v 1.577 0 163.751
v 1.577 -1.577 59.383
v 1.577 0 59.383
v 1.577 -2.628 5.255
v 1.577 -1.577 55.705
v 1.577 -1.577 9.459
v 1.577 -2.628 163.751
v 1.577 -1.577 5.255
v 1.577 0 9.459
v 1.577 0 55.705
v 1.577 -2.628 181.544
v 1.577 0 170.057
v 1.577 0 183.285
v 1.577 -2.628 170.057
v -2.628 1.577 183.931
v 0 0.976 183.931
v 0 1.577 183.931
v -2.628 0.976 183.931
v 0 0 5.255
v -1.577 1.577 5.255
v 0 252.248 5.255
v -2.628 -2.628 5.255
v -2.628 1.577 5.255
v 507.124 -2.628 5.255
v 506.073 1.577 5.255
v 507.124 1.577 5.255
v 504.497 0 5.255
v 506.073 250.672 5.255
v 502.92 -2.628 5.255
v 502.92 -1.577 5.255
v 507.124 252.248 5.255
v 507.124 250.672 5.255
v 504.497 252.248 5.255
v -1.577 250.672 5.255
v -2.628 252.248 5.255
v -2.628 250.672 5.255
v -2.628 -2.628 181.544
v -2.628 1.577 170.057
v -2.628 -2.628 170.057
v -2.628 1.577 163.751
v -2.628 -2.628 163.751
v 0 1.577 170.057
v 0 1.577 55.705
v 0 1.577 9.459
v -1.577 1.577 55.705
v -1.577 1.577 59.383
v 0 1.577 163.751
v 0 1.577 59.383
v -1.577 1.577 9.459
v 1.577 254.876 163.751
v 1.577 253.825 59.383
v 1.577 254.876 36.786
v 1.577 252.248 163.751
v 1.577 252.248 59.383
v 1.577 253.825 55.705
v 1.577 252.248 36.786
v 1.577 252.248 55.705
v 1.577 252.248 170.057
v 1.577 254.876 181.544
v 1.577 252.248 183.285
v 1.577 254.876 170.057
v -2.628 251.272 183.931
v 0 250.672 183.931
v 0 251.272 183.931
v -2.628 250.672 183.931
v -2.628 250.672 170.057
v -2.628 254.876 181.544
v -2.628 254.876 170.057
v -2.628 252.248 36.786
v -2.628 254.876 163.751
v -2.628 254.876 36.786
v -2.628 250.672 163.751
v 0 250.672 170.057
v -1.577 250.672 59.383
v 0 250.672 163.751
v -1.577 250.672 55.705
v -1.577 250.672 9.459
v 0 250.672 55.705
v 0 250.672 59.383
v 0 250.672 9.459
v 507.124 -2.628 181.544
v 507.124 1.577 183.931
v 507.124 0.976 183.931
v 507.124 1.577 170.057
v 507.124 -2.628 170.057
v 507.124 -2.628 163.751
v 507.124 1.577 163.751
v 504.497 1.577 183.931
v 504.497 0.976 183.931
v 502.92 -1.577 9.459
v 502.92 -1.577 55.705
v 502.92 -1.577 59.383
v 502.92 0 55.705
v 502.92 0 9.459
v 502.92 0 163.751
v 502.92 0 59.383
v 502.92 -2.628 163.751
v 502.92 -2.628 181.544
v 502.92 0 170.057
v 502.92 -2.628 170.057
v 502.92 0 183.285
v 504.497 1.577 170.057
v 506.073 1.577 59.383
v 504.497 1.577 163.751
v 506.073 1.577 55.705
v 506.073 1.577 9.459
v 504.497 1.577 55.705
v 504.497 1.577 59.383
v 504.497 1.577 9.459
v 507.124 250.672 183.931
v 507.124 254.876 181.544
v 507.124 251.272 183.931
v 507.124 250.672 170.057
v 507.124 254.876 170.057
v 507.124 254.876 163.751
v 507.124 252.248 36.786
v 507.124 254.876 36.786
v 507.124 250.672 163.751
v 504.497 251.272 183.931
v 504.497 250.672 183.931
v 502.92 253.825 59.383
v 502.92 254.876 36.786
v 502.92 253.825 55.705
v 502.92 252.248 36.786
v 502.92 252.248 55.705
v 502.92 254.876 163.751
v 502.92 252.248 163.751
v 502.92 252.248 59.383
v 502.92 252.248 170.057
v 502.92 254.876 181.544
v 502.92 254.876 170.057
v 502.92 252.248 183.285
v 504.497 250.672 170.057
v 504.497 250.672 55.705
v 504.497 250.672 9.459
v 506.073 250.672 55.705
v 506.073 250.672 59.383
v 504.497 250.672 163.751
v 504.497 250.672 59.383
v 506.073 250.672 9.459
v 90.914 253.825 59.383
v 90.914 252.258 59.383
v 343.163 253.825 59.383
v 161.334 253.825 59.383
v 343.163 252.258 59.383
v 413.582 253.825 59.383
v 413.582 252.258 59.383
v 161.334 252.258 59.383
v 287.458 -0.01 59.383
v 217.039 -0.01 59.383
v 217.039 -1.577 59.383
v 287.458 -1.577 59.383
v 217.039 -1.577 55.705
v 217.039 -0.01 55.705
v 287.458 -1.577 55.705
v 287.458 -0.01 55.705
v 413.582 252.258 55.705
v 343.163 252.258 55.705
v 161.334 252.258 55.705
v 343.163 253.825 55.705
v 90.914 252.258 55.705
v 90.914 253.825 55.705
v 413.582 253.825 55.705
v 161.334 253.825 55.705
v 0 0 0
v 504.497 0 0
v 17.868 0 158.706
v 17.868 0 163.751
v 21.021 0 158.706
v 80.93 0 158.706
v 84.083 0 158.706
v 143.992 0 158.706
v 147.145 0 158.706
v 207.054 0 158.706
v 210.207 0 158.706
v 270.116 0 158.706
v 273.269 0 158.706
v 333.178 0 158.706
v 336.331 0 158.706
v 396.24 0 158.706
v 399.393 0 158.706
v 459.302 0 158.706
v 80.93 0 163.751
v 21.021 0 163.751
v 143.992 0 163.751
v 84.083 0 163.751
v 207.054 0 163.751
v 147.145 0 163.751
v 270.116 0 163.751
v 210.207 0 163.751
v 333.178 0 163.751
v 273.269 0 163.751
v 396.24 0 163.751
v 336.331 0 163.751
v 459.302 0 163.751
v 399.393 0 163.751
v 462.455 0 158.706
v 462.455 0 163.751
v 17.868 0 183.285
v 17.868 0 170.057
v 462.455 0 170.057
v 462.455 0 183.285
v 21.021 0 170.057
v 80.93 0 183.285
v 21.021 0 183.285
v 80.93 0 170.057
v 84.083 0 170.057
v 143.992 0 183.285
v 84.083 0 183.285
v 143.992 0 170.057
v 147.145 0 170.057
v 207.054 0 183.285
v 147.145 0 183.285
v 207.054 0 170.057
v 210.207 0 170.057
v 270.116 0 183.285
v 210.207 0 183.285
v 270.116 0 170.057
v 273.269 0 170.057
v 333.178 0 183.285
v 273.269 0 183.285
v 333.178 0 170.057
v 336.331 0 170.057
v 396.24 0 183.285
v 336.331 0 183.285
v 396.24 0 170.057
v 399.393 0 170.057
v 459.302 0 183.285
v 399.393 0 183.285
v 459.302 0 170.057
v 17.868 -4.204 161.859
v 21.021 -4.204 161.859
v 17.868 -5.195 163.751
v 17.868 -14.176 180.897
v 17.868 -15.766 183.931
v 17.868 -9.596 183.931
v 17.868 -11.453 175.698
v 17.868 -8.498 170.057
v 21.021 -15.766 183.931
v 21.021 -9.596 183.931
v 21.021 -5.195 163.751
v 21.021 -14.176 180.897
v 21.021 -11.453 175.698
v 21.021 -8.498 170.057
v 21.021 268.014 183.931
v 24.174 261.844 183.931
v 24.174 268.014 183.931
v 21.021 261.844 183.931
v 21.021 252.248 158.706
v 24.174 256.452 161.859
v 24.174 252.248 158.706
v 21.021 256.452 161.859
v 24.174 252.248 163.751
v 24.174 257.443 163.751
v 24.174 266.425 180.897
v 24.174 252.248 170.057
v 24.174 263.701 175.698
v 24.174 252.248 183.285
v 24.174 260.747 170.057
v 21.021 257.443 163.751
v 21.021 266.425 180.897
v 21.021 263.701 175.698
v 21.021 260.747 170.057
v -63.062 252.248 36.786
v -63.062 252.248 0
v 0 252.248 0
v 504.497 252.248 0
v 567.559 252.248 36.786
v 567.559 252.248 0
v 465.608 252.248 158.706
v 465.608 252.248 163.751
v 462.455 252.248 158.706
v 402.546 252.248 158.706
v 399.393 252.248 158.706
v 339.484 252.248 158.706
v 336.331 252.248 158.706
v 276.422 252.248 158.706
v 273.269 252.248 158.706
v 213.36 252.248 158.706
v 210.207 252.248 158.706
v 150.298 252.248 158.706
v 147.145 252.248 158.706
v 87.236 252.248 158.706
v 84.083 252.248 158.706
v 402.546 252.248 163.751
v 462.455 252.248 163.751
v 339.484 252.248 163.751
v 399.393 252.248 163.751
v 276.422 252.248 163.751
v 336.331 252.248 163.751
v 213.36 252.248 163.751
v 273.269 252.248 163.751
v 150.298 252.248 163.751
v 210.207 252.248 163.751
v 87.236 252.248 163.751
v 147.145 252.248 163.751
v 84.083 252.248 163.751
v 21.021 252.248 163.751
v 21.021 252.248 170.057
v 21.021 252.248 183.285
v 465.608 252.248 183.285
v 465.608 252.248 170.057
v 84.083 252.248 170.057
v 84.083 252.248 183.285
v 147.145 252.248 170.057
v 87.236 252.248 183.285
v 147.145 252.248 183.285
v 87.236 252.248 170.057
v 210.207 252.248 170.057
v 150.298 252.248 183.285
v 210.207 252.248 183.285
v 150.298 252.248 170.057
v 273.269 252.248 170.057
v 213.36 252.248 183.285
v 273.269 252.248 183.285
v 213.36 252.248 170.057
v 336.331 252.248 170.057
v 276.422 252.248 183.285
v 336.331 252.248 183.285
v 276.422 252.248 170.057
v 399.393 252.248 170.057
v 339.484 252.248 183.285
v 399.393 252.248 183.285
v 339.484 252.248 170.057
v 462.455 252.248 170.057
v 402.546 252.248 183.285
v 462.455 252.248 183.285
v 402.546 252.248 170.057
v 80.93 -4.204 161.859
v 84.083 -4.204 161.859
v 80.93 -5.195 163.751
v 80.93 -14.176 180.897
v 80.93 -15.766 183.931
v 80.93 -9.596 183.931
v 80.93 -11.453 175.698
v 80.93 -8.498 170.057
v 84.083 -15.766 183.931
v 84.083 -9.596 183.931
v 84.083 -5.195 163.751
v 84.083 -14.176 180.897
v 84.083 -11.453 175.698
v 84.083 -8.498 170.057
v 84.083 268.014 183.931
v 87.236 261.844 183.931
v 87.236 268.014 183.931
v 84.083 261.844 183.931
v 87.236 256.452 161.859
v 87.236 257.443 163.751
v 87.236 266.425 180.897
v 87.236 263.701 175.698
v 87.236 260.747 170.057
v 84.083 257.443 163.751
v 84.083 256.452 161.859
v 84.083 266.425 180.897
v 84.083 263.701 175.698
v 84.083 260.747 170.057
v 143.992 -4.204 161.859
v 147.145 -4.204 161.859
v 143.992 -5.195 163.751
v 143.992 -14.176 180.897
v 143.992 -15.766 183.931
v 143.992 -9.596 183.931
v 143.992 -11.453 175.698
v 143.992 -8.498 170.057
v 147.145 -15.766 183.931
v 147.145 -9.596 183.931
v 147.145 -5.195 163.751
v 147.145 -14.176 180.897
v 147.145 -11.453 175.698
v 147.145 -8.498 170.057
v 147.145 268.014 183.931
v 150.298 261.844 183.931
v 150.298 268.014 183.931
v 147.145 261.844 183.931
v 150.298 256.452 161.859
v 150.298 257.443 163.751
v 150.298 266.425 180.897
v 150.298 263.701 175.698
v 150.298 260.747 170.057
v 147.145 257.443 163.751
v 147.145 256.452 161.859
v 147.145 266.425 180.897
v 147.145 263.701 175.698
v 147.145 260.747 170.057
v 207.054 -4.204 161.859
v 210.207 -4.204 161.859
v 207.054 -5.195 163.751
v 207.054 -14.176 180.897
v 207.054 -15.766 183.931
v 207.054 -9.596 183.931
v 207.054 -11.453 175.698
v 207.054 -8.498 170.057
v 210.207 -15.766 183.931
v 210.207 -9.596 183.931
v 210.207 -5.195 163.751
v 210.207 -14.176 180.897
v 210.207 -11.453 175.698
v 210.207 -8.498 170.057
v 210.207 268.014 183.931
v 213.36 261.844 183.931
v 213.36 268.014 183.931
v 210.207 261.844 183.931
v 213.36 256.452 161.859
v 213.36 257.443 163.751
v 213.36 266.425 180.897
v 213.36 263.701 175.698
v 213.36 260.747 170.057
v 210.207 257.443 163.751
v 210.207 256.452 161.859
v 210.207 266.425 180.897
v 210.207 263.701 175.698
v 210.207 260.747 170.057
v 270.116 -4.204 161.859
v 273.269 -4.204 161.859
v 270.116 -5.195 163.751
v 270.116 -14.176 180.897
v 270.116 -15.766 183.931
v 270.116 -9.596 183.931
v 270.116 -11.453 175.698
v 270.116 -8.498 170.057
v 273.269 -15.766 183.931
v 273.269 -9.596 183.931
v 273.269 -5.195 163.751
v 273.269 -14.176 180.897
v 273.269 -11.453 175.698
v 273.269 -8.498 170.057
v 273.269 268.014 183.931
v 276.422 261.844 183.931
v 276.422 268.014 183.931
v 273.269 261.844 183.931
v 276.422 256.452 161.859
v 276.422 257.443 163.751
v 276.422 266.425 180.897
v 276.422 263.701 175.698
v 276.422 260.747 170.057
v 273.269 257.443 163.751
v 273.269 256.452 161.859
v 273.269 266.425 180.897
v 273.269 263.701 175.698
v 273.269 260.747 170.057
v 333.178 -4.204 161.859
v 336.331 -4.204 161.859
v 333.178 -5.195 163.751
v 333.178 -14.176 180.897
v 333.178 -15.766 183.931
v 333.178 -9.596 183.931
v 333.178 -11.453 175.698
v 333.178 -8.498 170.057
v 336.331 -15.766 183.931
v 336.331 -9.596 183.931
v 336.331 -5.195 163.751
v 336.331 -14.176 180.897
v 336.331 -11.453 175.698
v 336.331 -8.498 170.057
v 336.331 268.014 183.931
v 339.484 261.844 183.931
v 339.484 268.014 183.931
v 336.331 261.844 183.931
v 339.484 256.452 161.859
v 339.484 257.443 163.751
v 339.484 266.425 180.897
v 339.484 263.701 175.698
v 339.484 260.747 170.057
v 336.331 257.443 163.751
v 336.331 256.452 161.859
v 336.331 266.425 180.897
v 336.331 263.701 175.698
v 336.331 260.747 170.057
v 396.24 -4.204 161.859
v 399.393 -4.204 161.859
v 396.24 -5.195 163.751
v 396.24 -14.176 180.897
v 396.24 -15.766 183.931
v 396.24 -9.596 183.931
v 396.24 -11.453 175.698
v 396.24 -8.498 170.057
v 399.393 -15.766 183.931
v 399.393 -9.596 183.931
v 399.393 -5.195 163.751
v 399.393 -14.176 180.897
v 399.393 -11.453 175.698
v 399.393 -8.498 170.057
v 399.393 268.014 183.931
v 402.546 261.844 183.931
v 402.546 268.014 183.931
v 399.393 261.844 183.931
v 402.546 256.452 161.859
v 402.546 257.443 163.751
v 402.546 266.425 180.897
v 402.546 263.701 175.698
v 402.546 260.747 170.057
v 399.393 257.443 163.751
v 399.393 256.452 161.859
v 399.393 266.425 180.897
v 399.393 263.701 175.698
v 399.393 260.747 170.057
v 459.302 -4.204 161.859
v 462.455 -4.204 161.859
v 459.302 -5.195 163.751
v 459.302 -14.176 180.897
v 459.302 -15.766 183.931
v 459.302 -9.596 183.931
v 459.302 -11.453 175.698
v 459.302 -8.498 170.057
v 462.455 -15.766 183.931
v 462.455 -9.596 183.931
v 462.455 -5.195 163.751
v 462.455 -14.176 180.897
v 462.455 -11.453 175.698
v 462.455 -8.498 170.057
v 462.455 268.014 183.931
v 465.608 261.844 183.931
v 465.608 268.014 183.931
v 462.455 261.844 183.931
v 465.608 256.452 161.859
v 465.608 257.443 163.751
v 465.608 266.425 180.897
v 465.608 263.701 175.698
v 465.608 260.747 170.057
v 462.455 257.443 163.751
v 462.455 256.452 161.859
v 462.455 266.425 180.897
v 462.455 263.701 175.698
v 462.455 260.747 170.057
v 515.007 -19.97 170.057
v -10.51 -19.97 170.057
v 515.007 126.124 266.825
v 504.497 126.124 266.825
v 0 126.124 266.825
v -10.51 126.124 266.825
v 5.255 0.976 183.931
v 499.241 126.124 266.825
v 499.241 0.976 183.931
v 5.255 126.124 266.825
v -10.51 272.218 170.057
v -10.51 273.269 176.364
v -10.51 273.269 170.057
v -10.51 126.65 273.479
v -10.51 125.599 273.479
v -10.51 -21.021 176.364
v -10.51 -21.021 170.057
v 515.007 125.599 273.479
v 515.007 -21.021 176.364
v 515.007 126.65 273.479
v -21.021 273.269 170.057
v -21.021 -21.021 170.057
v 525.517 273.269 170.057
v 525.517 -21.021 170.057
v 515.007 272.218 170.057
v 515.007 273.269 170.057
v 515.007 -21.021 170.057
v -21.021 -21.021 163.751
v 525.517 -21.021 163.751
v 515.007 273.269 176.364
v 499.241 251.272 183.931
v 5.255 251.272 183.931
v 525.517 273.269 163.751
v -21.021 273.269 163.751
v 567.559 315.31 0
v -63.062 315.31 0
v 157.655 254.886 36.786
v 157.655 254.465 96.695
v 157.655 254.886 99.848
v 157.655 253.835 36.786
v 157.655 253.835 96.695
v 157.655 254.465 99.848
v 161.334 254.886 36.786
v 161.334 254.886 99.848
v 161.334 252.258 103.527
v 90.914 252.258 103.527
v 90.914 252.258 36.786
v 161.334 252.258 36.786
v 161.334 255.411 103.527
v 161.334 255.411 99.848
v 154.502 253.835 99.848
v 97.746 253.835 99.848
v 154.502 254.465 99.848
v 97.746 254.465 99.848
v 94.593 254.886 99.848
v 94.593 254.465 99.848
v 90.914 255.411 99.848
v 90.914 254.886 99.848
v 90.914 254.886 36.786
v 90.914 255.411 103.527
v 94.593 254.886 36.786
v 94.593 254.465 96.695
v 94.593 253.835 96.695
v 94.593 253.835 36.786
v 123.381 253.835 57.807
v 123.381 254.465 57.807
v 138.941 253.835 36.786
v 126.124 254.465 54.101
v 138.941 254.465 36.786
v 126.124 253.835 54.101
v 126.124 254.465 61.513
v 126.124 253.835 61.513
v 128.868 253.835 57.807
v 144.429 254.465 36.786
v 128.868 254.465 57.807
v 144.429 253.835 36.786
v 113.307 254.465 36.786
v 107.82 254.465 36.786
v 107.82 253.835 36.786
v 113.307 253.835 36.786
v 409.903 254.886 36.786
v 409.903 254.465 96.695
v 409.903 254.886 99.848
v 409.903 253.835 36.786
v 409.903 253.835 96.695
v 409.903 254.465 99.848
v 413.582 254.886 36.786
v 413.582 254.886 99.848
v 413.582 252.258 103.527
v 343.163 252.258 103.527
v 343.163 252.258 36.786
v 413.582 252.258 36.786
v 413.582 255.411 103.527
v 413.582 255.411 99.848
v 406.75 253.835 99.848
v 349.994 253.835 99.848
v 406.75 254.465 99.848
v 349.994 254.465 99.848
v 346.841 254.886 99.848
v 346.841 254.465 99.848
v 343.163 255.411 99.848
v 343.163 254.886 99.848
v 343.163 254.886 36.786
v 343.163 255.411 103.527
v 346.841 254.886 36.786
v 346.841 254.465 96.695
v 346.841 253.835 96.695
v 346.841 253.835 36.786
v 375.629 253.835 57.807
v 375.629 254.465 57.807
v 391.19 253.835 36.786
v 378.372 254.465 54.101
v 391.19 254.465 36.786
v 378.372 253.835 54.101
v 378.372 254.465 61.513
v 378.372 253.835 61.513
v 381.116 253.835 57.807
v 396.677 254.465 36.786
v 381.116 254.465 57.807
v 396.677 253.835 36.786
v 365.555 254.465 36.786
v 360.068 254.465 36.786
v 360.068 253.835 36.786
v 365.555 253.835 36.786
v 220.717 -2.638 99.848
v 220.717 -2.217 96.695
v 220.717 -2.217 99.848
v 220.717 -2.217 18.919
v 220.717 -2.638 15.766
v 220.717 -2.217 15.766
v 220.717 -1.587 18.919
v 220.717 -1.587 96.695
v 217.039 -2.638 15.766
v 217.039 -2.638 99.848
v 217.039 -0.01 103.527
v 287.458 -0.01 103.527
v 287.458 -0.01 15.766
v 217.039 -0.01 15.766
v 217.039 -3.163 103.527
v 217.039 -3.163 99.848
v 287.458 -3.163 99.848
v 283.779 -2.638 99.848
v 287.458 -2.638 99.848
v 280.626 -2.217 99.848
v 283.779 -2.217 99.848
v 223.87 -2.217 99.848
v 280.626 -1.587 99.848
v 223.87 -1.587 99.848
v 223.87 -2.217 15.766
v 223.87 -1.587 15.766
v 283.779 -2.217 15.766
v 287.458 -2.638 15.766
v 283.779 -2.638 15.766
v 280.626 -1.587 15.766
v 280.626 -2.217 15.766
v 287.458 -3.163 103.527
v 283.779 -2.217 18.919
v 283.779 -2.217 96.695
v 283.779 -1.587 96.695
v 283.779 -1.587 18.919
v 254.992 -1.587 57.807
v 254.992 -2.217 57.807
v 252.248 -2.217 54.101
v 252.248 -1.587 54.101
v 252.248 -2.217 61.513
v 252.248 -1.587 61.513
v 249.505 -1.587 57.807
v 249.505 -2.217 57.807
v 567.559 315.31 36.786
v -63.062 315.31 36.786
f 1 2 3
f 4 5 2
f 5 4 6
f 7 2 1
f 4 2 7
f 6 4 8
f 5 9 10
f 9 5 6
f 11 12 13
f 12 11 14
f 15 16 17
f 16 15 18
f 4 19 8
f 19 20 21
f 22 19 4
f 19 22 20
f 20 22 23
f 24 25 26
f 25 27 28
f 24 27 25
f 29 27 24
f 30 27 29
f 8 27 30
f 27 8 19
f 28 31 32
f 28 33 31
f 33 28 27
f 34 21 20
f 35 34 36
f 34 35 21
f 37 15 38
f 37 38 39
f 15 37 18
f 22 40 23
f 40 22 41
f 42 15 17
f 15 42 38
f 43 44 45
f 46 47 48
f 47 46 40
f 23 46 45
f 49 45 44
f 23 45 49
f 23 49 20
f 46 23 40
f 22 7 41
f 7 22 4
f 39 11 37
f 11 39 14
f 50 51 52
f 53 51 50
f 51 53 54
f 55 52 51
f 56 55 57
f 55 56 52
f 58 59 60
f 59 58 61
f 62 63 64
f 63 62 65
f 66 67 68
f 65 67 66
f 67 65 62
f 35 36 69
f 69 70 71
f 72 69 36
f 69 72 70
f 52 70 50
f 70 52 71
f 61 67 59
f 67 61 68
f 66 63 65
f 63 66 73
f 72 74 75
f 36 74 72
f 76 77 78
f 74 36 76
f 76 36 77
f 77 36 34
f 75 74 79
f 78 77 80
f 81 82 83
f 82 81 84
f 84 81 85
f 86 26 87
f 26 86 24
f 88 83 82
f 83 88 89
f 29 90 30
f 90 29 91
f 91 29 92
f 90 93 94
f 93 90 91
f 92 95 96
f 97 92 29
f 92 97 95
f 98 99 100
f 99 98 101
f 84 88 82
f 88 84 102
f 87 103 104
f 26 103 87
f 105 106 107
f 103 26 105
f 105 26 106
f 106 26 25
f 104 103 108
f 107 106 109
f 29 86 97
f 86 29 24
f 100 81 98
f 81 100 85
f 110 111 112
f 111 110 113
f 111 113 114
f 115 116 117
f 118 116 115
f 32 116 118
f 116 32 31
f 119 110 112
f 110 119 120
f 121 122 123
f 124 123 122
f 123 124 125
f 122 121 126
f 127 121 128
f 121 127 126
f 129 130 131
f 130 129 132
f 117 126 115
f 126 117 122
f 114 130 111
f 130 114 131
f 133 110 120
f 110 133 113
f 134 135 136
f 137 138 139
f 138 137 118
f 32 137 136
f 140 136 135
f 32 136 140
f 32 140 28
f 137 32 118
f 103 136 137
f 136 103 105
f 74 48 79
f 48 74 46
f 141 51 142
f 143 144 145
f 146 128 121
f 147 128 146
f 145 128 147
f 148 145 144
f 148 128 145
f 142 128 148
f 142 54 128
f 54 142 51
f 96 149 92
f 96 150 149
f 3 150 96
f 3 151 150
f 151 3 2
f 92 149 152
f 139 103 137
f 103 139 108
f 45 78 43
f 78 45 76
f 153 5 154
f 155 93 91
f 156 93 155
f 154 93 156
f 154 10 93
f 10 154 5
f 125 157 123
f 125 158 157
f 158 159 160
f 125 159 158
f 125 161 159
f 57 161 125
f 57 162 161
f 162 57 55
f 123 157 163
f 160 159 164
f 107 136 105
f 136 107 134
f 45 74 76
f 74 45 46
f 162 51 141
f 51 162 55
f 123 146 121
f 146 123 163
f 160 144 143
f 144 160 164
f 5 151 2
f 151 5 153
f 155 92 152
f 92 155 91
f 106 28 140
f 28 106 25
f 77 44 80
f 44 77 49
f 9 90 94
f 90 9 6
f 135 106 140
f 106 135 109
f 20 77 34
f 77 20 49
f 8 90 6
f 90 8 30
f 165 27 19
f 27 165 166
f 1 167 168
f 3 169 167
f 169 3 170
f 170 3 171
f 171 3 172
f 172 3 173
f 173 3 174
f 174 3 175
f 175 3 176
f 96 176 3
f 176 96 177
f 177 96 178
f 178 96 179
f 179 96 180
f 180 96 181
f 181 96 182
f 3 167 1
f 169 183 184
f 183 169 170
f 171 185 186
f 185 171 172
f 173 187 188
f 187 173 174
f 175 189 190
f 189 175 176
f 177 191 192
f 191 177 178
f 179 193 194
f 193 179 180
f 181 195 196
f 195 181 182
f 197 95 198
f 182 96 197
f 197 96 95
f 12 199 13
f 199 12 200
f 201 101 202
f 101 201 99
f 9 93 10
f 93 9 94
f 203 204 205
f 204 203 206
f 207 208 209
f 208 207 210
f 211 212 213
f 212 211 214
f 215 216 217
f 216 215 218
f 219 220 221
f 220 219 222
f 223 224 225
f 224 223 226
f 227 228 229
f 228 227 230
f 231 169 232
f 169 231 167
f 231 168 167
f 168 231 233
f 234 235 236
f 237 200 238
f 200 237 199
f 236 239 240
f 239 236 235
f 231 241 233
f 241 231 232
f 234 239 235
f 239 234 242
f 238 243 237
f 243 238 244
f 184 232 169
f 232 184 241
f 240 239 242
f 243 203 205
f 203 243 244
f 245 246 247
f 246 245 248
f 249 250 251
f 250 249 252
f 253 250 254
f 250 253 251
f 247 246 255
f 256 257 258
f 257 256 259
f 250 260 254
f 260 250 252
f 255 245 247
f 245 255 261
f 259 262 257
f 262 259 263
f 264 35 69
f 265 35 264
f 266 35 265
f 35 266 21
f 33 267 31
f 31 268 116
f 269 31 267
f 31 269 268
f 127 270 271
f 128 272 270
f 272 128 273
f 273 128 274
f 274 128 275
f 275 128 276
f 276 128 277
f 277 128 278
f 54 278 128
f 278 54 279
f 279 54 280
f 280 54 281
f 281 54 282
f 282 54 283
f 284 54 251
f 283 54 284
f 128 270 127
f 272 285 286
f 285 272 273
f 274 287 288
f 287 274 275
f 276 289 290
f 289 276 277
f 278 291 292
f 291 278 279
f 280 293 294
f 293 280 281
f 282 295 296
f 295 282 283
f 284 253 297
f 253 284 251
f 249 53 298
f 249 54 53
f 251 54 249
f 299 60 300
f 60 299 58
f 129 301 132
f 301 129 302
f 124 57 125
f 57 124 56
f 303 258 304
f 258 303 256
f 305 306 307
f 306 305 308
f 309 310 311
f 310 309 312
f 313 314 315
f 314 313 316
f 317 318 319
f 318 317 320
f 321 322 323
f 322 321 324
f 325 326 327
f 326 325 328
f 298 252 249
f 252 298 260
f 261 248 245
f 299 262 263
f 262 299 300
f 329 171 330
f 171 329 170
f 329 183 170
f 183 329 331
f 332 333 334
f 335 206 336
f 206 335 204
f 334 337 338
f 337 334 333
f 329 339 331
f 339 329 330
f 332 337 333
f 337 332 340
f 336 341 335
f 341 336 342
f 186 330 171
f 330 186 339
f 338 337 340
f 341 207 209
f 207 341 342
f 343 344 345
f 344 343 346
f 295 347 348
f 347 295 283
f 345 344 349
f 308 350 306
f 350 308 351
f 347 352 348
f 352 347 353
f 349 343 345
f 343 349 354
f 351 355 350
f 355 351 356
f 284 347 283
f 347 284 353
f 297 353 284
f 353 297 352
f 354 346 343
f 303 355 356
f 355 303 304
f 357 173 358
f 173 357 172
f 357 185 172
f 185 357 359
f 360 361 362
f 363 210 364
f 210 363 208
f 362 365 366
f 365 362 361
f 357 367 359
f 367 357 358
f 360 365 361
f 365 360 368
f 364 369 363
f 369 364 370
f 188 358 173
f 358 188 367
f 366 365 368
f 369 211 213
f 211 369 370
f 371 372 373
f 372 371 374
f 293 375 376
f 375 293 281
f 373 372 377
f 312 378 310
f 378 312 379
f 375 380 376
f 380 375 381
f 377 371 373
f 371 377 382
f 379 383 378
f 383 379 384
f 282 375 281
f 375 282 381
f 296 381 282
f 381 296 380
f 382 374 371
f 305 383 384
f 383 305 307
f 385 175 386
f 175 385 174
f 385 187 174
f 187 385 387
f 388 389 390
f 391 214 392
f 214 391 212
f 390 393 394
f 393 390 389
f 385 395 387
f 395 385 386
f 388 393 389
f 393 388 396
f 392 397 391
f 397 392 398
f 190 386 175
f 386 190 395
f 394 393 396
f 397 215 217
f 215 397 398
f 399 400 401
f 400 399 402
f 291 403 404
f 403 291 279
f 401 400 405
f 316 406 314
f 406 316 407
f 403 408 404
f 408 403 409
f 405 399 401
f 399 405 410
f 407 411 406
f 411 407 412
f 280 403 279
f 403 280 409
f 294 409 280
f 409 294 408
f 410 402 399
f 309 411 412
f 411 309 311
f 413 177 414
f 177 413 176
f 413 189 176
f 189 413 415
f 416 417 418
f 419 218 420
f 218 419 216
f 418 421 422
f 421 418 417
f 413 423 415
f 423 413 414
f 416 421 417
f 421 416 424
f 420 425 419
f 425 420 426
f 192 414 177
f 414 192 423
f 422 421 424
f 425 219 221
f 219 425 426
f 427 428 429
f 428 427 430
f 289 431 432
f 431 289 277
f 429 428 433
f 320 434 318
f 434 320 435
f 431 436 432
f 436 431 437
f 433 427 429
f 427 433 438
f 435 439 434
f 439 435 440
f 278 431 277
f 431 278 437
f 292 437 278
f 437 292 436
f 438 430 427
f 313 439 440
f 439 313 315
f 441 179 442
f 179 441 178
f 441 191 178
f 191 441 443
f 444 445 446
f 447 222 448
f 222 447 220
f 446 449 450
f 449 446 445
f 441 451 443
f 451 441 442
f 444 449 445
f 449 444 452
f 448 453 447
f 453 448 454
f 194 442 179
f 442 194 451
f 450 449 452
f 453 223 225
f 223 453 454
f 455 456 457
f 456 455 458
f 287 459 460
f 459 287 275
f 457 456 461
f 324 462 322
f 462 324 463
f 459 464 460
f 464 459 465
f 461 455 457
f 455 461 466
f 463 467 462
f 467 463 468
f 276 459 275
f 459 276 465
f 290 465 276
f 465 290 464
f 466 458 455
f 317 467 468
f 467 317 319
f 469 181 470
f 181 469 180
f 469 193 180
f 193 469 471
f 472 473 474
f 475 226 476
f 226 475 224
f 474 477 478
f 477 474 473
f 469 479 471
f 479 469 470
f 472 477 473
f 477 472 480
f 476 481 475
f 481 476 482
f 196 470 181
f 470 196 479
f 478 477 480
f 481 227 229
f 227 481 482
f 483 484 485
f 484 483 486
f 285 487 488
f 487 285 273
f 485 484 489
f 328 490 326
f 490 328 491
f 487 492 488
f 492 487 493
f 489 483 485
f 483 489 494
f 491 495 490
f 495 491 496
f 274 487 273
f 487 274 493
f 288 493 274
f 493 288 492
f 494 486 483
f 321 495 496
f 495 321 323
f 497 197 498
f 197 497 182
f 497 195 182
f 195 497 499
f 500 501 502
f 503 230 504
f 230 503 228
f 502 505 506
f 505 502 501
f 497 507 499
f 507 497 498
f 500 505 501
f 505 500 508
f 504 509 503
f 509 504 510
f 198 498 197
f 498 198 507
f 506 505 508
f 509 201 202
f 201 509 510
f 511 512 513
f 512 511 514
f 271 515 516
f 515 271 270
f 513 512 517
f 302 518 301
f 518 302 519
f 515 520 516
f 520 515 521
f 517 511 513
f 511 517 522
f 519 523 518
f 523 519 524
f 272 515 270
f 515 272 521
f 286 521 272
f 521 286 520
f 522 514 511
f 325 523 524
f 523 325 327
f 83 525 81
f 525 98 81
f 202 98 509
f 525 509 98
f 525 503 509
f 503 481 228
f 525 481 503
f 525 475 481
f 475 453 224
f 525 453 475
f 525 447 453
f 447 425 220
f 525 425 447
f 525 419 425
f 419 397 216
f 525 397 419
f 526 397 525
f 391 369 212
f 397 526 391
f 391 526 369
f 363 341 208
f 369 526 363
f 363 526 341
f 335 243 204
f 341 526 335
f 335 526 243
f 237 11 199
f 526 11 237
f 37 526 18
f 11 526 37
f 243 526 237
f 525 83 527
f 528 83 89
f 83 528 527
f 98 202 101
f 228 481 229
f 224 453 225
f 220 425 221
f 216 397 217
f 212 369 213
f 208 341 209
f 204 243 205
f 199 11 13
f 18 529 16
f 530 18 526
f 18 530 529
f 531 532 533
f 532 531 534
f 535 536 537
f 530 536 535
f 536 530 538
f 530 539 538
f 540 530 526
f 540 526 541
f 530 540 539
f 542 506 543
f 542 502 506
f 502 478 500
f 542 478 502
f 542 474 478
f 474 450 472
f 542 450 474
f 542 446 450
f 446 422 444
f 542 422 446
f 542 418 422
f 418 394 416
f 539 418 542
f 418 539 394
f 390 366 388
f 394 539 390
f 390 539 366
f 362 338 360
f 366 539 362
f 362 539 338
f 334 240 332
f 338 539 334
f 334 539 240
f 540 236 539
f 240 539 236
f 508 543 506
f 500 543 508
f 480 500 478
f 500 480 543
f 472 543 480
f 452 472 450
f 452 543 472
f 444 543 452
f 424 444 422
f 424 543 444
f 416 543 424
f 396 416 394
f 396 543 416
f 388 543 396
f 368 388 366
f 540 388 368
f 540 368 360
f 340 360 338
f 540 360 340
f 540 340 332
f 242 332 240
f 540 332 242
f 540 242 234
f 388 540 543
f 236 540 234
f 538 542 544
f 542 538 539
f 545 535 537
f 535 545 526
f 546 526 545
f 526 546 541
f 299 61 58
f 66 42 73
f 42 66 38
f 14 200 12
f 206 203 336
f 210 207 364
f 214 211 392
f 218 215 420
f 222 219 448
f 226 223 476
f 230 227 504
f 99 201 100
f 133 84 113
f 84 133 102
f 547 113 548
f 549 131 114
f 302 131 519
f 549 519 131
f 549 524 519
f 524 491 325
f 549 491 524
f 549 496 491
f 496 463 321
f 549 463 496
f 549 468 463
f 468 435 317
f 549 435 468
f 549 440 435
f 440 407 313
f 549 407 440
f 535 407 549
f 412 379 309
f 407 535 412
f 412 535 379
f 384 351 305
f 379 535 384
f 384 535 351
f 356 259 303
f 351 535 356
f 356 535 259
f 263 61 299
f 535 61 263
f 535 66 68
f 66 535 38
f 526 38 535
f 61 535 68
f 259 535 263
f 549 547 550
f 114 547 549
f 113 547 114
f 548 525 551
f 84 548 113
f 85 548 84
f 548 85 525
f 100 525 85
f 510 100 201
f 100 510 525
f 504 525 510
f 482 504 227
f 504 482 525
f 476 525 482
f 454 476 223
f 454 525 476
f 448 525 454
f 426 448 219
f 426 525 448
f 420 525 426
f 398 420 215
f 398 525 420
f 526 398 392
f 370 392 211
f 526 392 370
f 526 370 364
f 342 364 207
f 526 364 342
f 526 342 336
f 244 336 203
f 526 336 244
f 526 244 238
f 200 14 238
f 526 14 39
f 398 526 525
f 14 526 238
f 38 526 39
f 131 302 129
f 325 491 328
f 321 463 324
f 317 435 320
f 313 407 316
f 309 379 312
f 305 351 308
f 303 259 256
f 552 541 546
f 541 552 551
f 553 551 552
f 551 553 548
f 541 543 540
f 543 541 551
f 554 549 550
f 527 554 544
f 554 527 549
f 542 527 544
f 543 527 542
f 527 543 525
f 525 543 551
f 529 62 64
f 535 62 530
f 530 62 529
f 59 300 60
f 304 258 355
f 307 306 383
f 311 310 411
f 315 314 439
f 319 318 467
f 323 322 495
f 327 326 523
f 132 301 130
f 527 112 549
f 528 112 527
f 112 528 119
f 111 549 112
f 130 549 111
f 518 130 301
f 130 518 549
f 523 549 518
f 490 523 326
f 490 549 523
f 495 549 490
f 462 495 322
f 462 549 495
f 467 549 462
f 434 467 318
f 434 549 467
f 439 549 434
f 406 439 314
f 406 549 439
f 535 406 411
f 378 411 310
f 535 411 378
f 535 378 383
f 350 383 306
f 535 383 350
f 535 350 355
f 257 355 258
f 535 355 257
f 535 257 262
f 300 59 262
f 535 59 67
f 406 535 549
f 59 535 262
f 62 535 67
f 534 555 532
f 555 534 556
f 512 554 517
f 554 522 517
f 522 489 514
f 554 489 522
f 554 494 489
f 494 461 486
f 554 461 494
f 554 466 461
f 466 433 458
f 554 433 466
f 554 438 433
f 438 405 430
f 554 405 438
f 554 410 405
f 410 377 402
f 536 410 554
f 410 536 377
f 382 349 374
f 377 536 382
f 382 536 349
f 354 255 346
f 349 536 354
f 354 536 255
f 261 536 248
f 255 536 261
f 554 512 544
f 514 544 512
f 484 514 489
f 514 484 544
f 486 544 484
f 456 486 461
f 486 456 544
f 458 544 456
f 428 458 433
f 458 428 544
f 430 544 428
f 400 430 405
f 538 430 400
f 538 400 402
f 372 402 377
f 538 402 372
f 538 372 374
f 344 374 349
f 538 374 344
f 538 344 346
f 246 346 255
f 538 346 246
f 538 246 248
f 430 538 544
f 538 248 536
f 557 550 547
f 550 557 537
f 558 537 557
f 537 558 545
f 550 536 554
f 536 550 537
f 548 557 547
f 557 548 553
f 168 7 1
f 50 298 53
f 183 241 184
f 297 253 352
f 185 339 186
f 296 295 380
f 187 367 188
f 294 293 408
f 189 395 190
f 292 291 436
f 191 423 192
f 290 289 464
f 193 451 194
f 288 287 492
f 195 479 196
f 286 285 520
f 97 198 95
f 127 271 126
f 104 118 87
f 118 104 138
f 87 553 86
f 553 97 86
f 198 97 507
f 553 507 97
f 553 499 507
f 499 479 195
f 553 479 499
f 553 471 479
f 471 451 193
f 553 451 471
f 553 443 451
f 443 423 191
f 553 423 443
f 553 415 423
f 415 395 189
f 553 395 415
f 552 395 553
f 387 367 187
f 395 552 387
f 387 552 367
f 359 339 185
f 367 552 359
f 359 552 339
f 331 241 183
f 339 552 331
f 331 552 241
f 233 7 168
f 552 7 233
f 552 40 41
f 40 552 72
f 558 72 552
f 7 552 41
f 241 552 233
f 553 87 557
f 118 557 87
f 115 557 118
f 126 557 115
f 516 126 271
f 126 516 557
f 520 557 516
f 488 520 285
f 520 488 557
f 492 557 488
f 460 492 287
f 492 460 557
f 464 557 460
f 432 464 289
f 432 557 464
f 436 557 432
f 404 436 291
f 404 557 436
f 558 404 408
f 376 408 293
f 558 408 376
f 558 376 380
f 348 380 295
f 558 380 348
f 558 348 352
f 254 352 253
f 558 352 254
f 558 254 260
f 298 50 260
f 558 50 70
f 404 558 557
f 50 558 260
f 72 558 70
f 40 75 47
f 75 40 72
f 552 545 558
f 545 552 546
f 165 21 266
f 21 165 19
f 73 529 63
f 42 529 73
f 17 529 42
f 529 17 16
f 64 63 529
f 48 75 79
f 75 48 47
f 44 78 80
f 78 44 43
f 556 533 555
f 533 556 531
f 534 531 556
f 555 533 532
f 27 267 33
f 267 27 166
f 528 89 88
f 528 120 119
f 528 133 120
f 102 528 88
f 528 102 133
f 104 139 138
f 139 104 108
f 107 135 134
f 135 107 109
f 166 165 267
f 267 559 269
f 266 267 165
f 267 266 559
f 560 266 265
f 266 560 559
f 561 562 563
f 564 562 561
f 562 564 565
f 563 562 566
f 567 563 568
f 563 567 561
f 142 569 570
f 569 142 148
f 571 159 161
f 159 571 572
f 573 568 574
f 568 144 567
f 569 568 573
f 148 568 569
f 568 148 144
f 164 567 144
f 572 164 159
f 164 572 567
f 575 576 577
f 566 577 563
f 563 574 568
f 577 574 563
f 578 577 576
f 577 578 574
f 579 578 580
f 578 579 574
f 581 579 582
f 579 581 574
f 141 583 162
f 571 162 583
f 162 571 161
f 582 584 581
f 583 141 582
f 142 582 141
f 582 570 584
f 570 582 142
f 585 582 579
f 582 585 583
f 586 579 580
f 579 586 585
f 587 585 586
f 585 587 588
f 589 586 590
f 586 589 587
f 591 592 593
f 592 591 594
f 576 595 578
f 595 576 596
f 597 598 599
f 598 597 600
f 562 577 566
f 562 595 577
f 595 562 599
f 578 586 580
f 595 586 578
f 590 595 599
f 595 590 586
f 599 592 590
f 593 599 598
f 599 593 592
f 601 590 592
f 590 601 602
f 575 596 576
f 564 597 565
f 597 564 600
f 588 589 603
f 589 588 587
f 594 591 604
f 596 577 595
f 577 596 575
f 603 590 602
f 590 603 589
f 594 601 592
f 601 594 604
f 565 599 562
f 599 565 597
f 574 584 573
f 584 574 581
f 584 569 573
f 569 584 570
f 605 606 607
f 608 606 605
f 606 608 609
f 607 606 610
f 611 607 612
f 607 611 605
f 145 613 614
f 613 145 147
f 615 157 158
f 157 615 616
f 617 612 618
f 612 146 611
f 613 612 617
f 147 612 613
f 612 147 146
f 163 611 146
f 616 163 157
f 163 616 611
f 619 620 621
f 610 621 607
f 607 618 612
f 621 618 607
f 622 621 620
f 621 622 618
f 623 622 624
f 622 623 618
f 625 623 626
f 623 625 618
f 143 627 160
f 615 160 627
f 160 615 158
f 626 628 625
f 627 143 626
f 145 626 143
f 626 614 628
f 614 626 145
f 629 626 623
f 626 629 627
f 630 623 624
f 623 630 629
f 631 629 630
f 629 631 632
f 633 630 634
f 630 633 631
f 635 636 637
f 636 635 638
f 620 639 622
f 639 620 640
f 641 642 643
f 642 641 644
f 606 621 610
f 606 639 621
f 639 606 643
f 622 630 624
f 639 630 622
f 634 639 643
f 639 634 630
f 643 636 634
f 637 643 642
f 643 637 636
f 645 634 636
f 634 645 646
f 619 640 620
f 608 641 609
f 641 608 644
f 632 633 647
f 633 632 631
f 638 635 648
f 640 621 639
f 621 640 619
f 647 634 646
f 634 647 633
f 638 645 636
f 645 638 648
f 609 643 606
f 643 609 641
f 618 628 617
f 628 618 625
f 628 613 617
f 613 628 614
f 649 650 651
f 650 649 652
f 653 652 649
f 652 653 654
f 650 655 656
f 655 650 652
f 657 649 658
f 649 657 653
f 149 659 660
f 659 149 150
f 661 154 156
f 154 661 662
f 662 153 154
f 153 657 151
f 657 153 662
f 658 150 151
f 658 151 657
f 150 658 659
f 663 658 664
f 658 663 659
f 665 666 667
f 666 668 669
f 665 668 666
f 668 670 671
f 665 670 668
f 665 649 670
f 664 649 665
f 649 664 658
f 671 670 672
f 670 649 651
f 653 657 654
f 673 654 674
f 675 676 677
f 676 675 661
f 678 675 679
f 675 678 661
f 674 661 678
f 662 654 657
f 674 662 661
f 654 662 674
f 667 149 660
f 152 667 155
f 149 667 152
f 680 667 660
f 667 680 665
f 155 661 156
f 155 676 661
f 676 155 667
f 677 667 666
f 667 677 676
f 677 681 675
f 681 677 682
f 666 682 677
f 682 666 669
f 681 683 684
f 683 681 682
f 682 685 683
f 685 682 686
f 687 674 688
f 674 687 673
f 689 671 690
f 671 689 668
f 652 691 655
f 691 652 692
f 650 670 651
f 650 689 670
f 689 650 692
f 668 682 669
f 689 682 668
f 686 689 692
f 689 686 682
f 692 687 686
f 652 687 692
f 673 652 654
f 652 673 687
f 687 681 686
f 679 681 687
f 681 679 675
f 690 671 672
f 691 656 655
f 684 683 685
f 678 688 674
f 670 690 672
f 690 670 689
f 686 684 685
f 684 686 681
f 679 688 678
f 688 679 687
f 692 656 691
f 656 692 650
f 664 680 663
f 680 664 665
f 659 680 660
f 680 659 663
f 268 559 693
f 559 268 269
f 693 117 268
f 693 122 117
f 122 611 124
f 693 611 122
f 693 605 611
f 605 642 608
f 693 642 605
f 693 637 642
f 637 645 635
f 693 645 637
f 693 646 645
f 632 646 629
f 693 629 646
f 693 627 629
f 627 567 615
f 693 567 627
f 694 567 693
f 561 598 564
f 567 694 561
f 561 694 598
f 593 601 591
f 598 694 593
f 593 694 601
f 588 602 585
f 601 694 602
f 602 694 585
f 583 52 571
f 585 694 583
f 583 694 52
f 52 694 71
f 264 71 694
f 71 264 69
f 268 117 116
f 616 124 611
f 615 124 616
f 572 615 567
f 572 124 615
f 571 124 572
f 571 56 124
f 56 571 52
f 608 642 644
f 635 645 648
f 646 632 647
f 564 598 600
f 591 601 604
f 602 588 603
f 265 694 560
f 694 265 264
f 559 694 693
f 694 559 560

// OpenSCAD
// =====================================================================
//  MILWAUKEE ROAD - WALWORTH, WIS. 24 X 48 FT FREIGHT HOUSE
//  Source: Album sheet 125, drawing B-755, Sept 16 1910 (also used at Mobridge, S.D. 1912).  Drawings are private reference (in copyright):
//  Research Library / RSW / Stations / Standard depots / Album of Depot Plans 1919.
//  Rib Side Works, 24 Nov 2026. FIRST SHAPE MODEL for review - not cut into print sections.
//  KNOWN (from the sheet): 24 x 48 ft, floor 3 ft 6 above rail on posts, 6 ft platform track side; 14 ft walls, 1/3 pitch shingle roof, drop siding, class B rolling doors.
//  ESTIMATE: wall and ridge heights where not written, window count and spacing, colours.
//  Built with the shared depot builder ../../../_common/rsw_depot.scad (x along the track,
//  y = 0 town side, track side +y, feet).  SCALE: 29 = G, 48 = O, 87 = HO.
// =====================================================================
SCALE = 29;
include <../../../_common/rsw_depot.scad>

depot(blocks = [[0, 48, 0, 24, 17.5, 0.66, 1, 2, 0]],
      pavs   = [],
      wins   = [],
      doors  = [[12, 1, 6, 8, 2], [36, 1, 6, 8, 2], [24, 0, 6, 8, 2]],
      bays   = [],
      chims  = [],
      plat   = [-6, 60, 6, 3.5]);
